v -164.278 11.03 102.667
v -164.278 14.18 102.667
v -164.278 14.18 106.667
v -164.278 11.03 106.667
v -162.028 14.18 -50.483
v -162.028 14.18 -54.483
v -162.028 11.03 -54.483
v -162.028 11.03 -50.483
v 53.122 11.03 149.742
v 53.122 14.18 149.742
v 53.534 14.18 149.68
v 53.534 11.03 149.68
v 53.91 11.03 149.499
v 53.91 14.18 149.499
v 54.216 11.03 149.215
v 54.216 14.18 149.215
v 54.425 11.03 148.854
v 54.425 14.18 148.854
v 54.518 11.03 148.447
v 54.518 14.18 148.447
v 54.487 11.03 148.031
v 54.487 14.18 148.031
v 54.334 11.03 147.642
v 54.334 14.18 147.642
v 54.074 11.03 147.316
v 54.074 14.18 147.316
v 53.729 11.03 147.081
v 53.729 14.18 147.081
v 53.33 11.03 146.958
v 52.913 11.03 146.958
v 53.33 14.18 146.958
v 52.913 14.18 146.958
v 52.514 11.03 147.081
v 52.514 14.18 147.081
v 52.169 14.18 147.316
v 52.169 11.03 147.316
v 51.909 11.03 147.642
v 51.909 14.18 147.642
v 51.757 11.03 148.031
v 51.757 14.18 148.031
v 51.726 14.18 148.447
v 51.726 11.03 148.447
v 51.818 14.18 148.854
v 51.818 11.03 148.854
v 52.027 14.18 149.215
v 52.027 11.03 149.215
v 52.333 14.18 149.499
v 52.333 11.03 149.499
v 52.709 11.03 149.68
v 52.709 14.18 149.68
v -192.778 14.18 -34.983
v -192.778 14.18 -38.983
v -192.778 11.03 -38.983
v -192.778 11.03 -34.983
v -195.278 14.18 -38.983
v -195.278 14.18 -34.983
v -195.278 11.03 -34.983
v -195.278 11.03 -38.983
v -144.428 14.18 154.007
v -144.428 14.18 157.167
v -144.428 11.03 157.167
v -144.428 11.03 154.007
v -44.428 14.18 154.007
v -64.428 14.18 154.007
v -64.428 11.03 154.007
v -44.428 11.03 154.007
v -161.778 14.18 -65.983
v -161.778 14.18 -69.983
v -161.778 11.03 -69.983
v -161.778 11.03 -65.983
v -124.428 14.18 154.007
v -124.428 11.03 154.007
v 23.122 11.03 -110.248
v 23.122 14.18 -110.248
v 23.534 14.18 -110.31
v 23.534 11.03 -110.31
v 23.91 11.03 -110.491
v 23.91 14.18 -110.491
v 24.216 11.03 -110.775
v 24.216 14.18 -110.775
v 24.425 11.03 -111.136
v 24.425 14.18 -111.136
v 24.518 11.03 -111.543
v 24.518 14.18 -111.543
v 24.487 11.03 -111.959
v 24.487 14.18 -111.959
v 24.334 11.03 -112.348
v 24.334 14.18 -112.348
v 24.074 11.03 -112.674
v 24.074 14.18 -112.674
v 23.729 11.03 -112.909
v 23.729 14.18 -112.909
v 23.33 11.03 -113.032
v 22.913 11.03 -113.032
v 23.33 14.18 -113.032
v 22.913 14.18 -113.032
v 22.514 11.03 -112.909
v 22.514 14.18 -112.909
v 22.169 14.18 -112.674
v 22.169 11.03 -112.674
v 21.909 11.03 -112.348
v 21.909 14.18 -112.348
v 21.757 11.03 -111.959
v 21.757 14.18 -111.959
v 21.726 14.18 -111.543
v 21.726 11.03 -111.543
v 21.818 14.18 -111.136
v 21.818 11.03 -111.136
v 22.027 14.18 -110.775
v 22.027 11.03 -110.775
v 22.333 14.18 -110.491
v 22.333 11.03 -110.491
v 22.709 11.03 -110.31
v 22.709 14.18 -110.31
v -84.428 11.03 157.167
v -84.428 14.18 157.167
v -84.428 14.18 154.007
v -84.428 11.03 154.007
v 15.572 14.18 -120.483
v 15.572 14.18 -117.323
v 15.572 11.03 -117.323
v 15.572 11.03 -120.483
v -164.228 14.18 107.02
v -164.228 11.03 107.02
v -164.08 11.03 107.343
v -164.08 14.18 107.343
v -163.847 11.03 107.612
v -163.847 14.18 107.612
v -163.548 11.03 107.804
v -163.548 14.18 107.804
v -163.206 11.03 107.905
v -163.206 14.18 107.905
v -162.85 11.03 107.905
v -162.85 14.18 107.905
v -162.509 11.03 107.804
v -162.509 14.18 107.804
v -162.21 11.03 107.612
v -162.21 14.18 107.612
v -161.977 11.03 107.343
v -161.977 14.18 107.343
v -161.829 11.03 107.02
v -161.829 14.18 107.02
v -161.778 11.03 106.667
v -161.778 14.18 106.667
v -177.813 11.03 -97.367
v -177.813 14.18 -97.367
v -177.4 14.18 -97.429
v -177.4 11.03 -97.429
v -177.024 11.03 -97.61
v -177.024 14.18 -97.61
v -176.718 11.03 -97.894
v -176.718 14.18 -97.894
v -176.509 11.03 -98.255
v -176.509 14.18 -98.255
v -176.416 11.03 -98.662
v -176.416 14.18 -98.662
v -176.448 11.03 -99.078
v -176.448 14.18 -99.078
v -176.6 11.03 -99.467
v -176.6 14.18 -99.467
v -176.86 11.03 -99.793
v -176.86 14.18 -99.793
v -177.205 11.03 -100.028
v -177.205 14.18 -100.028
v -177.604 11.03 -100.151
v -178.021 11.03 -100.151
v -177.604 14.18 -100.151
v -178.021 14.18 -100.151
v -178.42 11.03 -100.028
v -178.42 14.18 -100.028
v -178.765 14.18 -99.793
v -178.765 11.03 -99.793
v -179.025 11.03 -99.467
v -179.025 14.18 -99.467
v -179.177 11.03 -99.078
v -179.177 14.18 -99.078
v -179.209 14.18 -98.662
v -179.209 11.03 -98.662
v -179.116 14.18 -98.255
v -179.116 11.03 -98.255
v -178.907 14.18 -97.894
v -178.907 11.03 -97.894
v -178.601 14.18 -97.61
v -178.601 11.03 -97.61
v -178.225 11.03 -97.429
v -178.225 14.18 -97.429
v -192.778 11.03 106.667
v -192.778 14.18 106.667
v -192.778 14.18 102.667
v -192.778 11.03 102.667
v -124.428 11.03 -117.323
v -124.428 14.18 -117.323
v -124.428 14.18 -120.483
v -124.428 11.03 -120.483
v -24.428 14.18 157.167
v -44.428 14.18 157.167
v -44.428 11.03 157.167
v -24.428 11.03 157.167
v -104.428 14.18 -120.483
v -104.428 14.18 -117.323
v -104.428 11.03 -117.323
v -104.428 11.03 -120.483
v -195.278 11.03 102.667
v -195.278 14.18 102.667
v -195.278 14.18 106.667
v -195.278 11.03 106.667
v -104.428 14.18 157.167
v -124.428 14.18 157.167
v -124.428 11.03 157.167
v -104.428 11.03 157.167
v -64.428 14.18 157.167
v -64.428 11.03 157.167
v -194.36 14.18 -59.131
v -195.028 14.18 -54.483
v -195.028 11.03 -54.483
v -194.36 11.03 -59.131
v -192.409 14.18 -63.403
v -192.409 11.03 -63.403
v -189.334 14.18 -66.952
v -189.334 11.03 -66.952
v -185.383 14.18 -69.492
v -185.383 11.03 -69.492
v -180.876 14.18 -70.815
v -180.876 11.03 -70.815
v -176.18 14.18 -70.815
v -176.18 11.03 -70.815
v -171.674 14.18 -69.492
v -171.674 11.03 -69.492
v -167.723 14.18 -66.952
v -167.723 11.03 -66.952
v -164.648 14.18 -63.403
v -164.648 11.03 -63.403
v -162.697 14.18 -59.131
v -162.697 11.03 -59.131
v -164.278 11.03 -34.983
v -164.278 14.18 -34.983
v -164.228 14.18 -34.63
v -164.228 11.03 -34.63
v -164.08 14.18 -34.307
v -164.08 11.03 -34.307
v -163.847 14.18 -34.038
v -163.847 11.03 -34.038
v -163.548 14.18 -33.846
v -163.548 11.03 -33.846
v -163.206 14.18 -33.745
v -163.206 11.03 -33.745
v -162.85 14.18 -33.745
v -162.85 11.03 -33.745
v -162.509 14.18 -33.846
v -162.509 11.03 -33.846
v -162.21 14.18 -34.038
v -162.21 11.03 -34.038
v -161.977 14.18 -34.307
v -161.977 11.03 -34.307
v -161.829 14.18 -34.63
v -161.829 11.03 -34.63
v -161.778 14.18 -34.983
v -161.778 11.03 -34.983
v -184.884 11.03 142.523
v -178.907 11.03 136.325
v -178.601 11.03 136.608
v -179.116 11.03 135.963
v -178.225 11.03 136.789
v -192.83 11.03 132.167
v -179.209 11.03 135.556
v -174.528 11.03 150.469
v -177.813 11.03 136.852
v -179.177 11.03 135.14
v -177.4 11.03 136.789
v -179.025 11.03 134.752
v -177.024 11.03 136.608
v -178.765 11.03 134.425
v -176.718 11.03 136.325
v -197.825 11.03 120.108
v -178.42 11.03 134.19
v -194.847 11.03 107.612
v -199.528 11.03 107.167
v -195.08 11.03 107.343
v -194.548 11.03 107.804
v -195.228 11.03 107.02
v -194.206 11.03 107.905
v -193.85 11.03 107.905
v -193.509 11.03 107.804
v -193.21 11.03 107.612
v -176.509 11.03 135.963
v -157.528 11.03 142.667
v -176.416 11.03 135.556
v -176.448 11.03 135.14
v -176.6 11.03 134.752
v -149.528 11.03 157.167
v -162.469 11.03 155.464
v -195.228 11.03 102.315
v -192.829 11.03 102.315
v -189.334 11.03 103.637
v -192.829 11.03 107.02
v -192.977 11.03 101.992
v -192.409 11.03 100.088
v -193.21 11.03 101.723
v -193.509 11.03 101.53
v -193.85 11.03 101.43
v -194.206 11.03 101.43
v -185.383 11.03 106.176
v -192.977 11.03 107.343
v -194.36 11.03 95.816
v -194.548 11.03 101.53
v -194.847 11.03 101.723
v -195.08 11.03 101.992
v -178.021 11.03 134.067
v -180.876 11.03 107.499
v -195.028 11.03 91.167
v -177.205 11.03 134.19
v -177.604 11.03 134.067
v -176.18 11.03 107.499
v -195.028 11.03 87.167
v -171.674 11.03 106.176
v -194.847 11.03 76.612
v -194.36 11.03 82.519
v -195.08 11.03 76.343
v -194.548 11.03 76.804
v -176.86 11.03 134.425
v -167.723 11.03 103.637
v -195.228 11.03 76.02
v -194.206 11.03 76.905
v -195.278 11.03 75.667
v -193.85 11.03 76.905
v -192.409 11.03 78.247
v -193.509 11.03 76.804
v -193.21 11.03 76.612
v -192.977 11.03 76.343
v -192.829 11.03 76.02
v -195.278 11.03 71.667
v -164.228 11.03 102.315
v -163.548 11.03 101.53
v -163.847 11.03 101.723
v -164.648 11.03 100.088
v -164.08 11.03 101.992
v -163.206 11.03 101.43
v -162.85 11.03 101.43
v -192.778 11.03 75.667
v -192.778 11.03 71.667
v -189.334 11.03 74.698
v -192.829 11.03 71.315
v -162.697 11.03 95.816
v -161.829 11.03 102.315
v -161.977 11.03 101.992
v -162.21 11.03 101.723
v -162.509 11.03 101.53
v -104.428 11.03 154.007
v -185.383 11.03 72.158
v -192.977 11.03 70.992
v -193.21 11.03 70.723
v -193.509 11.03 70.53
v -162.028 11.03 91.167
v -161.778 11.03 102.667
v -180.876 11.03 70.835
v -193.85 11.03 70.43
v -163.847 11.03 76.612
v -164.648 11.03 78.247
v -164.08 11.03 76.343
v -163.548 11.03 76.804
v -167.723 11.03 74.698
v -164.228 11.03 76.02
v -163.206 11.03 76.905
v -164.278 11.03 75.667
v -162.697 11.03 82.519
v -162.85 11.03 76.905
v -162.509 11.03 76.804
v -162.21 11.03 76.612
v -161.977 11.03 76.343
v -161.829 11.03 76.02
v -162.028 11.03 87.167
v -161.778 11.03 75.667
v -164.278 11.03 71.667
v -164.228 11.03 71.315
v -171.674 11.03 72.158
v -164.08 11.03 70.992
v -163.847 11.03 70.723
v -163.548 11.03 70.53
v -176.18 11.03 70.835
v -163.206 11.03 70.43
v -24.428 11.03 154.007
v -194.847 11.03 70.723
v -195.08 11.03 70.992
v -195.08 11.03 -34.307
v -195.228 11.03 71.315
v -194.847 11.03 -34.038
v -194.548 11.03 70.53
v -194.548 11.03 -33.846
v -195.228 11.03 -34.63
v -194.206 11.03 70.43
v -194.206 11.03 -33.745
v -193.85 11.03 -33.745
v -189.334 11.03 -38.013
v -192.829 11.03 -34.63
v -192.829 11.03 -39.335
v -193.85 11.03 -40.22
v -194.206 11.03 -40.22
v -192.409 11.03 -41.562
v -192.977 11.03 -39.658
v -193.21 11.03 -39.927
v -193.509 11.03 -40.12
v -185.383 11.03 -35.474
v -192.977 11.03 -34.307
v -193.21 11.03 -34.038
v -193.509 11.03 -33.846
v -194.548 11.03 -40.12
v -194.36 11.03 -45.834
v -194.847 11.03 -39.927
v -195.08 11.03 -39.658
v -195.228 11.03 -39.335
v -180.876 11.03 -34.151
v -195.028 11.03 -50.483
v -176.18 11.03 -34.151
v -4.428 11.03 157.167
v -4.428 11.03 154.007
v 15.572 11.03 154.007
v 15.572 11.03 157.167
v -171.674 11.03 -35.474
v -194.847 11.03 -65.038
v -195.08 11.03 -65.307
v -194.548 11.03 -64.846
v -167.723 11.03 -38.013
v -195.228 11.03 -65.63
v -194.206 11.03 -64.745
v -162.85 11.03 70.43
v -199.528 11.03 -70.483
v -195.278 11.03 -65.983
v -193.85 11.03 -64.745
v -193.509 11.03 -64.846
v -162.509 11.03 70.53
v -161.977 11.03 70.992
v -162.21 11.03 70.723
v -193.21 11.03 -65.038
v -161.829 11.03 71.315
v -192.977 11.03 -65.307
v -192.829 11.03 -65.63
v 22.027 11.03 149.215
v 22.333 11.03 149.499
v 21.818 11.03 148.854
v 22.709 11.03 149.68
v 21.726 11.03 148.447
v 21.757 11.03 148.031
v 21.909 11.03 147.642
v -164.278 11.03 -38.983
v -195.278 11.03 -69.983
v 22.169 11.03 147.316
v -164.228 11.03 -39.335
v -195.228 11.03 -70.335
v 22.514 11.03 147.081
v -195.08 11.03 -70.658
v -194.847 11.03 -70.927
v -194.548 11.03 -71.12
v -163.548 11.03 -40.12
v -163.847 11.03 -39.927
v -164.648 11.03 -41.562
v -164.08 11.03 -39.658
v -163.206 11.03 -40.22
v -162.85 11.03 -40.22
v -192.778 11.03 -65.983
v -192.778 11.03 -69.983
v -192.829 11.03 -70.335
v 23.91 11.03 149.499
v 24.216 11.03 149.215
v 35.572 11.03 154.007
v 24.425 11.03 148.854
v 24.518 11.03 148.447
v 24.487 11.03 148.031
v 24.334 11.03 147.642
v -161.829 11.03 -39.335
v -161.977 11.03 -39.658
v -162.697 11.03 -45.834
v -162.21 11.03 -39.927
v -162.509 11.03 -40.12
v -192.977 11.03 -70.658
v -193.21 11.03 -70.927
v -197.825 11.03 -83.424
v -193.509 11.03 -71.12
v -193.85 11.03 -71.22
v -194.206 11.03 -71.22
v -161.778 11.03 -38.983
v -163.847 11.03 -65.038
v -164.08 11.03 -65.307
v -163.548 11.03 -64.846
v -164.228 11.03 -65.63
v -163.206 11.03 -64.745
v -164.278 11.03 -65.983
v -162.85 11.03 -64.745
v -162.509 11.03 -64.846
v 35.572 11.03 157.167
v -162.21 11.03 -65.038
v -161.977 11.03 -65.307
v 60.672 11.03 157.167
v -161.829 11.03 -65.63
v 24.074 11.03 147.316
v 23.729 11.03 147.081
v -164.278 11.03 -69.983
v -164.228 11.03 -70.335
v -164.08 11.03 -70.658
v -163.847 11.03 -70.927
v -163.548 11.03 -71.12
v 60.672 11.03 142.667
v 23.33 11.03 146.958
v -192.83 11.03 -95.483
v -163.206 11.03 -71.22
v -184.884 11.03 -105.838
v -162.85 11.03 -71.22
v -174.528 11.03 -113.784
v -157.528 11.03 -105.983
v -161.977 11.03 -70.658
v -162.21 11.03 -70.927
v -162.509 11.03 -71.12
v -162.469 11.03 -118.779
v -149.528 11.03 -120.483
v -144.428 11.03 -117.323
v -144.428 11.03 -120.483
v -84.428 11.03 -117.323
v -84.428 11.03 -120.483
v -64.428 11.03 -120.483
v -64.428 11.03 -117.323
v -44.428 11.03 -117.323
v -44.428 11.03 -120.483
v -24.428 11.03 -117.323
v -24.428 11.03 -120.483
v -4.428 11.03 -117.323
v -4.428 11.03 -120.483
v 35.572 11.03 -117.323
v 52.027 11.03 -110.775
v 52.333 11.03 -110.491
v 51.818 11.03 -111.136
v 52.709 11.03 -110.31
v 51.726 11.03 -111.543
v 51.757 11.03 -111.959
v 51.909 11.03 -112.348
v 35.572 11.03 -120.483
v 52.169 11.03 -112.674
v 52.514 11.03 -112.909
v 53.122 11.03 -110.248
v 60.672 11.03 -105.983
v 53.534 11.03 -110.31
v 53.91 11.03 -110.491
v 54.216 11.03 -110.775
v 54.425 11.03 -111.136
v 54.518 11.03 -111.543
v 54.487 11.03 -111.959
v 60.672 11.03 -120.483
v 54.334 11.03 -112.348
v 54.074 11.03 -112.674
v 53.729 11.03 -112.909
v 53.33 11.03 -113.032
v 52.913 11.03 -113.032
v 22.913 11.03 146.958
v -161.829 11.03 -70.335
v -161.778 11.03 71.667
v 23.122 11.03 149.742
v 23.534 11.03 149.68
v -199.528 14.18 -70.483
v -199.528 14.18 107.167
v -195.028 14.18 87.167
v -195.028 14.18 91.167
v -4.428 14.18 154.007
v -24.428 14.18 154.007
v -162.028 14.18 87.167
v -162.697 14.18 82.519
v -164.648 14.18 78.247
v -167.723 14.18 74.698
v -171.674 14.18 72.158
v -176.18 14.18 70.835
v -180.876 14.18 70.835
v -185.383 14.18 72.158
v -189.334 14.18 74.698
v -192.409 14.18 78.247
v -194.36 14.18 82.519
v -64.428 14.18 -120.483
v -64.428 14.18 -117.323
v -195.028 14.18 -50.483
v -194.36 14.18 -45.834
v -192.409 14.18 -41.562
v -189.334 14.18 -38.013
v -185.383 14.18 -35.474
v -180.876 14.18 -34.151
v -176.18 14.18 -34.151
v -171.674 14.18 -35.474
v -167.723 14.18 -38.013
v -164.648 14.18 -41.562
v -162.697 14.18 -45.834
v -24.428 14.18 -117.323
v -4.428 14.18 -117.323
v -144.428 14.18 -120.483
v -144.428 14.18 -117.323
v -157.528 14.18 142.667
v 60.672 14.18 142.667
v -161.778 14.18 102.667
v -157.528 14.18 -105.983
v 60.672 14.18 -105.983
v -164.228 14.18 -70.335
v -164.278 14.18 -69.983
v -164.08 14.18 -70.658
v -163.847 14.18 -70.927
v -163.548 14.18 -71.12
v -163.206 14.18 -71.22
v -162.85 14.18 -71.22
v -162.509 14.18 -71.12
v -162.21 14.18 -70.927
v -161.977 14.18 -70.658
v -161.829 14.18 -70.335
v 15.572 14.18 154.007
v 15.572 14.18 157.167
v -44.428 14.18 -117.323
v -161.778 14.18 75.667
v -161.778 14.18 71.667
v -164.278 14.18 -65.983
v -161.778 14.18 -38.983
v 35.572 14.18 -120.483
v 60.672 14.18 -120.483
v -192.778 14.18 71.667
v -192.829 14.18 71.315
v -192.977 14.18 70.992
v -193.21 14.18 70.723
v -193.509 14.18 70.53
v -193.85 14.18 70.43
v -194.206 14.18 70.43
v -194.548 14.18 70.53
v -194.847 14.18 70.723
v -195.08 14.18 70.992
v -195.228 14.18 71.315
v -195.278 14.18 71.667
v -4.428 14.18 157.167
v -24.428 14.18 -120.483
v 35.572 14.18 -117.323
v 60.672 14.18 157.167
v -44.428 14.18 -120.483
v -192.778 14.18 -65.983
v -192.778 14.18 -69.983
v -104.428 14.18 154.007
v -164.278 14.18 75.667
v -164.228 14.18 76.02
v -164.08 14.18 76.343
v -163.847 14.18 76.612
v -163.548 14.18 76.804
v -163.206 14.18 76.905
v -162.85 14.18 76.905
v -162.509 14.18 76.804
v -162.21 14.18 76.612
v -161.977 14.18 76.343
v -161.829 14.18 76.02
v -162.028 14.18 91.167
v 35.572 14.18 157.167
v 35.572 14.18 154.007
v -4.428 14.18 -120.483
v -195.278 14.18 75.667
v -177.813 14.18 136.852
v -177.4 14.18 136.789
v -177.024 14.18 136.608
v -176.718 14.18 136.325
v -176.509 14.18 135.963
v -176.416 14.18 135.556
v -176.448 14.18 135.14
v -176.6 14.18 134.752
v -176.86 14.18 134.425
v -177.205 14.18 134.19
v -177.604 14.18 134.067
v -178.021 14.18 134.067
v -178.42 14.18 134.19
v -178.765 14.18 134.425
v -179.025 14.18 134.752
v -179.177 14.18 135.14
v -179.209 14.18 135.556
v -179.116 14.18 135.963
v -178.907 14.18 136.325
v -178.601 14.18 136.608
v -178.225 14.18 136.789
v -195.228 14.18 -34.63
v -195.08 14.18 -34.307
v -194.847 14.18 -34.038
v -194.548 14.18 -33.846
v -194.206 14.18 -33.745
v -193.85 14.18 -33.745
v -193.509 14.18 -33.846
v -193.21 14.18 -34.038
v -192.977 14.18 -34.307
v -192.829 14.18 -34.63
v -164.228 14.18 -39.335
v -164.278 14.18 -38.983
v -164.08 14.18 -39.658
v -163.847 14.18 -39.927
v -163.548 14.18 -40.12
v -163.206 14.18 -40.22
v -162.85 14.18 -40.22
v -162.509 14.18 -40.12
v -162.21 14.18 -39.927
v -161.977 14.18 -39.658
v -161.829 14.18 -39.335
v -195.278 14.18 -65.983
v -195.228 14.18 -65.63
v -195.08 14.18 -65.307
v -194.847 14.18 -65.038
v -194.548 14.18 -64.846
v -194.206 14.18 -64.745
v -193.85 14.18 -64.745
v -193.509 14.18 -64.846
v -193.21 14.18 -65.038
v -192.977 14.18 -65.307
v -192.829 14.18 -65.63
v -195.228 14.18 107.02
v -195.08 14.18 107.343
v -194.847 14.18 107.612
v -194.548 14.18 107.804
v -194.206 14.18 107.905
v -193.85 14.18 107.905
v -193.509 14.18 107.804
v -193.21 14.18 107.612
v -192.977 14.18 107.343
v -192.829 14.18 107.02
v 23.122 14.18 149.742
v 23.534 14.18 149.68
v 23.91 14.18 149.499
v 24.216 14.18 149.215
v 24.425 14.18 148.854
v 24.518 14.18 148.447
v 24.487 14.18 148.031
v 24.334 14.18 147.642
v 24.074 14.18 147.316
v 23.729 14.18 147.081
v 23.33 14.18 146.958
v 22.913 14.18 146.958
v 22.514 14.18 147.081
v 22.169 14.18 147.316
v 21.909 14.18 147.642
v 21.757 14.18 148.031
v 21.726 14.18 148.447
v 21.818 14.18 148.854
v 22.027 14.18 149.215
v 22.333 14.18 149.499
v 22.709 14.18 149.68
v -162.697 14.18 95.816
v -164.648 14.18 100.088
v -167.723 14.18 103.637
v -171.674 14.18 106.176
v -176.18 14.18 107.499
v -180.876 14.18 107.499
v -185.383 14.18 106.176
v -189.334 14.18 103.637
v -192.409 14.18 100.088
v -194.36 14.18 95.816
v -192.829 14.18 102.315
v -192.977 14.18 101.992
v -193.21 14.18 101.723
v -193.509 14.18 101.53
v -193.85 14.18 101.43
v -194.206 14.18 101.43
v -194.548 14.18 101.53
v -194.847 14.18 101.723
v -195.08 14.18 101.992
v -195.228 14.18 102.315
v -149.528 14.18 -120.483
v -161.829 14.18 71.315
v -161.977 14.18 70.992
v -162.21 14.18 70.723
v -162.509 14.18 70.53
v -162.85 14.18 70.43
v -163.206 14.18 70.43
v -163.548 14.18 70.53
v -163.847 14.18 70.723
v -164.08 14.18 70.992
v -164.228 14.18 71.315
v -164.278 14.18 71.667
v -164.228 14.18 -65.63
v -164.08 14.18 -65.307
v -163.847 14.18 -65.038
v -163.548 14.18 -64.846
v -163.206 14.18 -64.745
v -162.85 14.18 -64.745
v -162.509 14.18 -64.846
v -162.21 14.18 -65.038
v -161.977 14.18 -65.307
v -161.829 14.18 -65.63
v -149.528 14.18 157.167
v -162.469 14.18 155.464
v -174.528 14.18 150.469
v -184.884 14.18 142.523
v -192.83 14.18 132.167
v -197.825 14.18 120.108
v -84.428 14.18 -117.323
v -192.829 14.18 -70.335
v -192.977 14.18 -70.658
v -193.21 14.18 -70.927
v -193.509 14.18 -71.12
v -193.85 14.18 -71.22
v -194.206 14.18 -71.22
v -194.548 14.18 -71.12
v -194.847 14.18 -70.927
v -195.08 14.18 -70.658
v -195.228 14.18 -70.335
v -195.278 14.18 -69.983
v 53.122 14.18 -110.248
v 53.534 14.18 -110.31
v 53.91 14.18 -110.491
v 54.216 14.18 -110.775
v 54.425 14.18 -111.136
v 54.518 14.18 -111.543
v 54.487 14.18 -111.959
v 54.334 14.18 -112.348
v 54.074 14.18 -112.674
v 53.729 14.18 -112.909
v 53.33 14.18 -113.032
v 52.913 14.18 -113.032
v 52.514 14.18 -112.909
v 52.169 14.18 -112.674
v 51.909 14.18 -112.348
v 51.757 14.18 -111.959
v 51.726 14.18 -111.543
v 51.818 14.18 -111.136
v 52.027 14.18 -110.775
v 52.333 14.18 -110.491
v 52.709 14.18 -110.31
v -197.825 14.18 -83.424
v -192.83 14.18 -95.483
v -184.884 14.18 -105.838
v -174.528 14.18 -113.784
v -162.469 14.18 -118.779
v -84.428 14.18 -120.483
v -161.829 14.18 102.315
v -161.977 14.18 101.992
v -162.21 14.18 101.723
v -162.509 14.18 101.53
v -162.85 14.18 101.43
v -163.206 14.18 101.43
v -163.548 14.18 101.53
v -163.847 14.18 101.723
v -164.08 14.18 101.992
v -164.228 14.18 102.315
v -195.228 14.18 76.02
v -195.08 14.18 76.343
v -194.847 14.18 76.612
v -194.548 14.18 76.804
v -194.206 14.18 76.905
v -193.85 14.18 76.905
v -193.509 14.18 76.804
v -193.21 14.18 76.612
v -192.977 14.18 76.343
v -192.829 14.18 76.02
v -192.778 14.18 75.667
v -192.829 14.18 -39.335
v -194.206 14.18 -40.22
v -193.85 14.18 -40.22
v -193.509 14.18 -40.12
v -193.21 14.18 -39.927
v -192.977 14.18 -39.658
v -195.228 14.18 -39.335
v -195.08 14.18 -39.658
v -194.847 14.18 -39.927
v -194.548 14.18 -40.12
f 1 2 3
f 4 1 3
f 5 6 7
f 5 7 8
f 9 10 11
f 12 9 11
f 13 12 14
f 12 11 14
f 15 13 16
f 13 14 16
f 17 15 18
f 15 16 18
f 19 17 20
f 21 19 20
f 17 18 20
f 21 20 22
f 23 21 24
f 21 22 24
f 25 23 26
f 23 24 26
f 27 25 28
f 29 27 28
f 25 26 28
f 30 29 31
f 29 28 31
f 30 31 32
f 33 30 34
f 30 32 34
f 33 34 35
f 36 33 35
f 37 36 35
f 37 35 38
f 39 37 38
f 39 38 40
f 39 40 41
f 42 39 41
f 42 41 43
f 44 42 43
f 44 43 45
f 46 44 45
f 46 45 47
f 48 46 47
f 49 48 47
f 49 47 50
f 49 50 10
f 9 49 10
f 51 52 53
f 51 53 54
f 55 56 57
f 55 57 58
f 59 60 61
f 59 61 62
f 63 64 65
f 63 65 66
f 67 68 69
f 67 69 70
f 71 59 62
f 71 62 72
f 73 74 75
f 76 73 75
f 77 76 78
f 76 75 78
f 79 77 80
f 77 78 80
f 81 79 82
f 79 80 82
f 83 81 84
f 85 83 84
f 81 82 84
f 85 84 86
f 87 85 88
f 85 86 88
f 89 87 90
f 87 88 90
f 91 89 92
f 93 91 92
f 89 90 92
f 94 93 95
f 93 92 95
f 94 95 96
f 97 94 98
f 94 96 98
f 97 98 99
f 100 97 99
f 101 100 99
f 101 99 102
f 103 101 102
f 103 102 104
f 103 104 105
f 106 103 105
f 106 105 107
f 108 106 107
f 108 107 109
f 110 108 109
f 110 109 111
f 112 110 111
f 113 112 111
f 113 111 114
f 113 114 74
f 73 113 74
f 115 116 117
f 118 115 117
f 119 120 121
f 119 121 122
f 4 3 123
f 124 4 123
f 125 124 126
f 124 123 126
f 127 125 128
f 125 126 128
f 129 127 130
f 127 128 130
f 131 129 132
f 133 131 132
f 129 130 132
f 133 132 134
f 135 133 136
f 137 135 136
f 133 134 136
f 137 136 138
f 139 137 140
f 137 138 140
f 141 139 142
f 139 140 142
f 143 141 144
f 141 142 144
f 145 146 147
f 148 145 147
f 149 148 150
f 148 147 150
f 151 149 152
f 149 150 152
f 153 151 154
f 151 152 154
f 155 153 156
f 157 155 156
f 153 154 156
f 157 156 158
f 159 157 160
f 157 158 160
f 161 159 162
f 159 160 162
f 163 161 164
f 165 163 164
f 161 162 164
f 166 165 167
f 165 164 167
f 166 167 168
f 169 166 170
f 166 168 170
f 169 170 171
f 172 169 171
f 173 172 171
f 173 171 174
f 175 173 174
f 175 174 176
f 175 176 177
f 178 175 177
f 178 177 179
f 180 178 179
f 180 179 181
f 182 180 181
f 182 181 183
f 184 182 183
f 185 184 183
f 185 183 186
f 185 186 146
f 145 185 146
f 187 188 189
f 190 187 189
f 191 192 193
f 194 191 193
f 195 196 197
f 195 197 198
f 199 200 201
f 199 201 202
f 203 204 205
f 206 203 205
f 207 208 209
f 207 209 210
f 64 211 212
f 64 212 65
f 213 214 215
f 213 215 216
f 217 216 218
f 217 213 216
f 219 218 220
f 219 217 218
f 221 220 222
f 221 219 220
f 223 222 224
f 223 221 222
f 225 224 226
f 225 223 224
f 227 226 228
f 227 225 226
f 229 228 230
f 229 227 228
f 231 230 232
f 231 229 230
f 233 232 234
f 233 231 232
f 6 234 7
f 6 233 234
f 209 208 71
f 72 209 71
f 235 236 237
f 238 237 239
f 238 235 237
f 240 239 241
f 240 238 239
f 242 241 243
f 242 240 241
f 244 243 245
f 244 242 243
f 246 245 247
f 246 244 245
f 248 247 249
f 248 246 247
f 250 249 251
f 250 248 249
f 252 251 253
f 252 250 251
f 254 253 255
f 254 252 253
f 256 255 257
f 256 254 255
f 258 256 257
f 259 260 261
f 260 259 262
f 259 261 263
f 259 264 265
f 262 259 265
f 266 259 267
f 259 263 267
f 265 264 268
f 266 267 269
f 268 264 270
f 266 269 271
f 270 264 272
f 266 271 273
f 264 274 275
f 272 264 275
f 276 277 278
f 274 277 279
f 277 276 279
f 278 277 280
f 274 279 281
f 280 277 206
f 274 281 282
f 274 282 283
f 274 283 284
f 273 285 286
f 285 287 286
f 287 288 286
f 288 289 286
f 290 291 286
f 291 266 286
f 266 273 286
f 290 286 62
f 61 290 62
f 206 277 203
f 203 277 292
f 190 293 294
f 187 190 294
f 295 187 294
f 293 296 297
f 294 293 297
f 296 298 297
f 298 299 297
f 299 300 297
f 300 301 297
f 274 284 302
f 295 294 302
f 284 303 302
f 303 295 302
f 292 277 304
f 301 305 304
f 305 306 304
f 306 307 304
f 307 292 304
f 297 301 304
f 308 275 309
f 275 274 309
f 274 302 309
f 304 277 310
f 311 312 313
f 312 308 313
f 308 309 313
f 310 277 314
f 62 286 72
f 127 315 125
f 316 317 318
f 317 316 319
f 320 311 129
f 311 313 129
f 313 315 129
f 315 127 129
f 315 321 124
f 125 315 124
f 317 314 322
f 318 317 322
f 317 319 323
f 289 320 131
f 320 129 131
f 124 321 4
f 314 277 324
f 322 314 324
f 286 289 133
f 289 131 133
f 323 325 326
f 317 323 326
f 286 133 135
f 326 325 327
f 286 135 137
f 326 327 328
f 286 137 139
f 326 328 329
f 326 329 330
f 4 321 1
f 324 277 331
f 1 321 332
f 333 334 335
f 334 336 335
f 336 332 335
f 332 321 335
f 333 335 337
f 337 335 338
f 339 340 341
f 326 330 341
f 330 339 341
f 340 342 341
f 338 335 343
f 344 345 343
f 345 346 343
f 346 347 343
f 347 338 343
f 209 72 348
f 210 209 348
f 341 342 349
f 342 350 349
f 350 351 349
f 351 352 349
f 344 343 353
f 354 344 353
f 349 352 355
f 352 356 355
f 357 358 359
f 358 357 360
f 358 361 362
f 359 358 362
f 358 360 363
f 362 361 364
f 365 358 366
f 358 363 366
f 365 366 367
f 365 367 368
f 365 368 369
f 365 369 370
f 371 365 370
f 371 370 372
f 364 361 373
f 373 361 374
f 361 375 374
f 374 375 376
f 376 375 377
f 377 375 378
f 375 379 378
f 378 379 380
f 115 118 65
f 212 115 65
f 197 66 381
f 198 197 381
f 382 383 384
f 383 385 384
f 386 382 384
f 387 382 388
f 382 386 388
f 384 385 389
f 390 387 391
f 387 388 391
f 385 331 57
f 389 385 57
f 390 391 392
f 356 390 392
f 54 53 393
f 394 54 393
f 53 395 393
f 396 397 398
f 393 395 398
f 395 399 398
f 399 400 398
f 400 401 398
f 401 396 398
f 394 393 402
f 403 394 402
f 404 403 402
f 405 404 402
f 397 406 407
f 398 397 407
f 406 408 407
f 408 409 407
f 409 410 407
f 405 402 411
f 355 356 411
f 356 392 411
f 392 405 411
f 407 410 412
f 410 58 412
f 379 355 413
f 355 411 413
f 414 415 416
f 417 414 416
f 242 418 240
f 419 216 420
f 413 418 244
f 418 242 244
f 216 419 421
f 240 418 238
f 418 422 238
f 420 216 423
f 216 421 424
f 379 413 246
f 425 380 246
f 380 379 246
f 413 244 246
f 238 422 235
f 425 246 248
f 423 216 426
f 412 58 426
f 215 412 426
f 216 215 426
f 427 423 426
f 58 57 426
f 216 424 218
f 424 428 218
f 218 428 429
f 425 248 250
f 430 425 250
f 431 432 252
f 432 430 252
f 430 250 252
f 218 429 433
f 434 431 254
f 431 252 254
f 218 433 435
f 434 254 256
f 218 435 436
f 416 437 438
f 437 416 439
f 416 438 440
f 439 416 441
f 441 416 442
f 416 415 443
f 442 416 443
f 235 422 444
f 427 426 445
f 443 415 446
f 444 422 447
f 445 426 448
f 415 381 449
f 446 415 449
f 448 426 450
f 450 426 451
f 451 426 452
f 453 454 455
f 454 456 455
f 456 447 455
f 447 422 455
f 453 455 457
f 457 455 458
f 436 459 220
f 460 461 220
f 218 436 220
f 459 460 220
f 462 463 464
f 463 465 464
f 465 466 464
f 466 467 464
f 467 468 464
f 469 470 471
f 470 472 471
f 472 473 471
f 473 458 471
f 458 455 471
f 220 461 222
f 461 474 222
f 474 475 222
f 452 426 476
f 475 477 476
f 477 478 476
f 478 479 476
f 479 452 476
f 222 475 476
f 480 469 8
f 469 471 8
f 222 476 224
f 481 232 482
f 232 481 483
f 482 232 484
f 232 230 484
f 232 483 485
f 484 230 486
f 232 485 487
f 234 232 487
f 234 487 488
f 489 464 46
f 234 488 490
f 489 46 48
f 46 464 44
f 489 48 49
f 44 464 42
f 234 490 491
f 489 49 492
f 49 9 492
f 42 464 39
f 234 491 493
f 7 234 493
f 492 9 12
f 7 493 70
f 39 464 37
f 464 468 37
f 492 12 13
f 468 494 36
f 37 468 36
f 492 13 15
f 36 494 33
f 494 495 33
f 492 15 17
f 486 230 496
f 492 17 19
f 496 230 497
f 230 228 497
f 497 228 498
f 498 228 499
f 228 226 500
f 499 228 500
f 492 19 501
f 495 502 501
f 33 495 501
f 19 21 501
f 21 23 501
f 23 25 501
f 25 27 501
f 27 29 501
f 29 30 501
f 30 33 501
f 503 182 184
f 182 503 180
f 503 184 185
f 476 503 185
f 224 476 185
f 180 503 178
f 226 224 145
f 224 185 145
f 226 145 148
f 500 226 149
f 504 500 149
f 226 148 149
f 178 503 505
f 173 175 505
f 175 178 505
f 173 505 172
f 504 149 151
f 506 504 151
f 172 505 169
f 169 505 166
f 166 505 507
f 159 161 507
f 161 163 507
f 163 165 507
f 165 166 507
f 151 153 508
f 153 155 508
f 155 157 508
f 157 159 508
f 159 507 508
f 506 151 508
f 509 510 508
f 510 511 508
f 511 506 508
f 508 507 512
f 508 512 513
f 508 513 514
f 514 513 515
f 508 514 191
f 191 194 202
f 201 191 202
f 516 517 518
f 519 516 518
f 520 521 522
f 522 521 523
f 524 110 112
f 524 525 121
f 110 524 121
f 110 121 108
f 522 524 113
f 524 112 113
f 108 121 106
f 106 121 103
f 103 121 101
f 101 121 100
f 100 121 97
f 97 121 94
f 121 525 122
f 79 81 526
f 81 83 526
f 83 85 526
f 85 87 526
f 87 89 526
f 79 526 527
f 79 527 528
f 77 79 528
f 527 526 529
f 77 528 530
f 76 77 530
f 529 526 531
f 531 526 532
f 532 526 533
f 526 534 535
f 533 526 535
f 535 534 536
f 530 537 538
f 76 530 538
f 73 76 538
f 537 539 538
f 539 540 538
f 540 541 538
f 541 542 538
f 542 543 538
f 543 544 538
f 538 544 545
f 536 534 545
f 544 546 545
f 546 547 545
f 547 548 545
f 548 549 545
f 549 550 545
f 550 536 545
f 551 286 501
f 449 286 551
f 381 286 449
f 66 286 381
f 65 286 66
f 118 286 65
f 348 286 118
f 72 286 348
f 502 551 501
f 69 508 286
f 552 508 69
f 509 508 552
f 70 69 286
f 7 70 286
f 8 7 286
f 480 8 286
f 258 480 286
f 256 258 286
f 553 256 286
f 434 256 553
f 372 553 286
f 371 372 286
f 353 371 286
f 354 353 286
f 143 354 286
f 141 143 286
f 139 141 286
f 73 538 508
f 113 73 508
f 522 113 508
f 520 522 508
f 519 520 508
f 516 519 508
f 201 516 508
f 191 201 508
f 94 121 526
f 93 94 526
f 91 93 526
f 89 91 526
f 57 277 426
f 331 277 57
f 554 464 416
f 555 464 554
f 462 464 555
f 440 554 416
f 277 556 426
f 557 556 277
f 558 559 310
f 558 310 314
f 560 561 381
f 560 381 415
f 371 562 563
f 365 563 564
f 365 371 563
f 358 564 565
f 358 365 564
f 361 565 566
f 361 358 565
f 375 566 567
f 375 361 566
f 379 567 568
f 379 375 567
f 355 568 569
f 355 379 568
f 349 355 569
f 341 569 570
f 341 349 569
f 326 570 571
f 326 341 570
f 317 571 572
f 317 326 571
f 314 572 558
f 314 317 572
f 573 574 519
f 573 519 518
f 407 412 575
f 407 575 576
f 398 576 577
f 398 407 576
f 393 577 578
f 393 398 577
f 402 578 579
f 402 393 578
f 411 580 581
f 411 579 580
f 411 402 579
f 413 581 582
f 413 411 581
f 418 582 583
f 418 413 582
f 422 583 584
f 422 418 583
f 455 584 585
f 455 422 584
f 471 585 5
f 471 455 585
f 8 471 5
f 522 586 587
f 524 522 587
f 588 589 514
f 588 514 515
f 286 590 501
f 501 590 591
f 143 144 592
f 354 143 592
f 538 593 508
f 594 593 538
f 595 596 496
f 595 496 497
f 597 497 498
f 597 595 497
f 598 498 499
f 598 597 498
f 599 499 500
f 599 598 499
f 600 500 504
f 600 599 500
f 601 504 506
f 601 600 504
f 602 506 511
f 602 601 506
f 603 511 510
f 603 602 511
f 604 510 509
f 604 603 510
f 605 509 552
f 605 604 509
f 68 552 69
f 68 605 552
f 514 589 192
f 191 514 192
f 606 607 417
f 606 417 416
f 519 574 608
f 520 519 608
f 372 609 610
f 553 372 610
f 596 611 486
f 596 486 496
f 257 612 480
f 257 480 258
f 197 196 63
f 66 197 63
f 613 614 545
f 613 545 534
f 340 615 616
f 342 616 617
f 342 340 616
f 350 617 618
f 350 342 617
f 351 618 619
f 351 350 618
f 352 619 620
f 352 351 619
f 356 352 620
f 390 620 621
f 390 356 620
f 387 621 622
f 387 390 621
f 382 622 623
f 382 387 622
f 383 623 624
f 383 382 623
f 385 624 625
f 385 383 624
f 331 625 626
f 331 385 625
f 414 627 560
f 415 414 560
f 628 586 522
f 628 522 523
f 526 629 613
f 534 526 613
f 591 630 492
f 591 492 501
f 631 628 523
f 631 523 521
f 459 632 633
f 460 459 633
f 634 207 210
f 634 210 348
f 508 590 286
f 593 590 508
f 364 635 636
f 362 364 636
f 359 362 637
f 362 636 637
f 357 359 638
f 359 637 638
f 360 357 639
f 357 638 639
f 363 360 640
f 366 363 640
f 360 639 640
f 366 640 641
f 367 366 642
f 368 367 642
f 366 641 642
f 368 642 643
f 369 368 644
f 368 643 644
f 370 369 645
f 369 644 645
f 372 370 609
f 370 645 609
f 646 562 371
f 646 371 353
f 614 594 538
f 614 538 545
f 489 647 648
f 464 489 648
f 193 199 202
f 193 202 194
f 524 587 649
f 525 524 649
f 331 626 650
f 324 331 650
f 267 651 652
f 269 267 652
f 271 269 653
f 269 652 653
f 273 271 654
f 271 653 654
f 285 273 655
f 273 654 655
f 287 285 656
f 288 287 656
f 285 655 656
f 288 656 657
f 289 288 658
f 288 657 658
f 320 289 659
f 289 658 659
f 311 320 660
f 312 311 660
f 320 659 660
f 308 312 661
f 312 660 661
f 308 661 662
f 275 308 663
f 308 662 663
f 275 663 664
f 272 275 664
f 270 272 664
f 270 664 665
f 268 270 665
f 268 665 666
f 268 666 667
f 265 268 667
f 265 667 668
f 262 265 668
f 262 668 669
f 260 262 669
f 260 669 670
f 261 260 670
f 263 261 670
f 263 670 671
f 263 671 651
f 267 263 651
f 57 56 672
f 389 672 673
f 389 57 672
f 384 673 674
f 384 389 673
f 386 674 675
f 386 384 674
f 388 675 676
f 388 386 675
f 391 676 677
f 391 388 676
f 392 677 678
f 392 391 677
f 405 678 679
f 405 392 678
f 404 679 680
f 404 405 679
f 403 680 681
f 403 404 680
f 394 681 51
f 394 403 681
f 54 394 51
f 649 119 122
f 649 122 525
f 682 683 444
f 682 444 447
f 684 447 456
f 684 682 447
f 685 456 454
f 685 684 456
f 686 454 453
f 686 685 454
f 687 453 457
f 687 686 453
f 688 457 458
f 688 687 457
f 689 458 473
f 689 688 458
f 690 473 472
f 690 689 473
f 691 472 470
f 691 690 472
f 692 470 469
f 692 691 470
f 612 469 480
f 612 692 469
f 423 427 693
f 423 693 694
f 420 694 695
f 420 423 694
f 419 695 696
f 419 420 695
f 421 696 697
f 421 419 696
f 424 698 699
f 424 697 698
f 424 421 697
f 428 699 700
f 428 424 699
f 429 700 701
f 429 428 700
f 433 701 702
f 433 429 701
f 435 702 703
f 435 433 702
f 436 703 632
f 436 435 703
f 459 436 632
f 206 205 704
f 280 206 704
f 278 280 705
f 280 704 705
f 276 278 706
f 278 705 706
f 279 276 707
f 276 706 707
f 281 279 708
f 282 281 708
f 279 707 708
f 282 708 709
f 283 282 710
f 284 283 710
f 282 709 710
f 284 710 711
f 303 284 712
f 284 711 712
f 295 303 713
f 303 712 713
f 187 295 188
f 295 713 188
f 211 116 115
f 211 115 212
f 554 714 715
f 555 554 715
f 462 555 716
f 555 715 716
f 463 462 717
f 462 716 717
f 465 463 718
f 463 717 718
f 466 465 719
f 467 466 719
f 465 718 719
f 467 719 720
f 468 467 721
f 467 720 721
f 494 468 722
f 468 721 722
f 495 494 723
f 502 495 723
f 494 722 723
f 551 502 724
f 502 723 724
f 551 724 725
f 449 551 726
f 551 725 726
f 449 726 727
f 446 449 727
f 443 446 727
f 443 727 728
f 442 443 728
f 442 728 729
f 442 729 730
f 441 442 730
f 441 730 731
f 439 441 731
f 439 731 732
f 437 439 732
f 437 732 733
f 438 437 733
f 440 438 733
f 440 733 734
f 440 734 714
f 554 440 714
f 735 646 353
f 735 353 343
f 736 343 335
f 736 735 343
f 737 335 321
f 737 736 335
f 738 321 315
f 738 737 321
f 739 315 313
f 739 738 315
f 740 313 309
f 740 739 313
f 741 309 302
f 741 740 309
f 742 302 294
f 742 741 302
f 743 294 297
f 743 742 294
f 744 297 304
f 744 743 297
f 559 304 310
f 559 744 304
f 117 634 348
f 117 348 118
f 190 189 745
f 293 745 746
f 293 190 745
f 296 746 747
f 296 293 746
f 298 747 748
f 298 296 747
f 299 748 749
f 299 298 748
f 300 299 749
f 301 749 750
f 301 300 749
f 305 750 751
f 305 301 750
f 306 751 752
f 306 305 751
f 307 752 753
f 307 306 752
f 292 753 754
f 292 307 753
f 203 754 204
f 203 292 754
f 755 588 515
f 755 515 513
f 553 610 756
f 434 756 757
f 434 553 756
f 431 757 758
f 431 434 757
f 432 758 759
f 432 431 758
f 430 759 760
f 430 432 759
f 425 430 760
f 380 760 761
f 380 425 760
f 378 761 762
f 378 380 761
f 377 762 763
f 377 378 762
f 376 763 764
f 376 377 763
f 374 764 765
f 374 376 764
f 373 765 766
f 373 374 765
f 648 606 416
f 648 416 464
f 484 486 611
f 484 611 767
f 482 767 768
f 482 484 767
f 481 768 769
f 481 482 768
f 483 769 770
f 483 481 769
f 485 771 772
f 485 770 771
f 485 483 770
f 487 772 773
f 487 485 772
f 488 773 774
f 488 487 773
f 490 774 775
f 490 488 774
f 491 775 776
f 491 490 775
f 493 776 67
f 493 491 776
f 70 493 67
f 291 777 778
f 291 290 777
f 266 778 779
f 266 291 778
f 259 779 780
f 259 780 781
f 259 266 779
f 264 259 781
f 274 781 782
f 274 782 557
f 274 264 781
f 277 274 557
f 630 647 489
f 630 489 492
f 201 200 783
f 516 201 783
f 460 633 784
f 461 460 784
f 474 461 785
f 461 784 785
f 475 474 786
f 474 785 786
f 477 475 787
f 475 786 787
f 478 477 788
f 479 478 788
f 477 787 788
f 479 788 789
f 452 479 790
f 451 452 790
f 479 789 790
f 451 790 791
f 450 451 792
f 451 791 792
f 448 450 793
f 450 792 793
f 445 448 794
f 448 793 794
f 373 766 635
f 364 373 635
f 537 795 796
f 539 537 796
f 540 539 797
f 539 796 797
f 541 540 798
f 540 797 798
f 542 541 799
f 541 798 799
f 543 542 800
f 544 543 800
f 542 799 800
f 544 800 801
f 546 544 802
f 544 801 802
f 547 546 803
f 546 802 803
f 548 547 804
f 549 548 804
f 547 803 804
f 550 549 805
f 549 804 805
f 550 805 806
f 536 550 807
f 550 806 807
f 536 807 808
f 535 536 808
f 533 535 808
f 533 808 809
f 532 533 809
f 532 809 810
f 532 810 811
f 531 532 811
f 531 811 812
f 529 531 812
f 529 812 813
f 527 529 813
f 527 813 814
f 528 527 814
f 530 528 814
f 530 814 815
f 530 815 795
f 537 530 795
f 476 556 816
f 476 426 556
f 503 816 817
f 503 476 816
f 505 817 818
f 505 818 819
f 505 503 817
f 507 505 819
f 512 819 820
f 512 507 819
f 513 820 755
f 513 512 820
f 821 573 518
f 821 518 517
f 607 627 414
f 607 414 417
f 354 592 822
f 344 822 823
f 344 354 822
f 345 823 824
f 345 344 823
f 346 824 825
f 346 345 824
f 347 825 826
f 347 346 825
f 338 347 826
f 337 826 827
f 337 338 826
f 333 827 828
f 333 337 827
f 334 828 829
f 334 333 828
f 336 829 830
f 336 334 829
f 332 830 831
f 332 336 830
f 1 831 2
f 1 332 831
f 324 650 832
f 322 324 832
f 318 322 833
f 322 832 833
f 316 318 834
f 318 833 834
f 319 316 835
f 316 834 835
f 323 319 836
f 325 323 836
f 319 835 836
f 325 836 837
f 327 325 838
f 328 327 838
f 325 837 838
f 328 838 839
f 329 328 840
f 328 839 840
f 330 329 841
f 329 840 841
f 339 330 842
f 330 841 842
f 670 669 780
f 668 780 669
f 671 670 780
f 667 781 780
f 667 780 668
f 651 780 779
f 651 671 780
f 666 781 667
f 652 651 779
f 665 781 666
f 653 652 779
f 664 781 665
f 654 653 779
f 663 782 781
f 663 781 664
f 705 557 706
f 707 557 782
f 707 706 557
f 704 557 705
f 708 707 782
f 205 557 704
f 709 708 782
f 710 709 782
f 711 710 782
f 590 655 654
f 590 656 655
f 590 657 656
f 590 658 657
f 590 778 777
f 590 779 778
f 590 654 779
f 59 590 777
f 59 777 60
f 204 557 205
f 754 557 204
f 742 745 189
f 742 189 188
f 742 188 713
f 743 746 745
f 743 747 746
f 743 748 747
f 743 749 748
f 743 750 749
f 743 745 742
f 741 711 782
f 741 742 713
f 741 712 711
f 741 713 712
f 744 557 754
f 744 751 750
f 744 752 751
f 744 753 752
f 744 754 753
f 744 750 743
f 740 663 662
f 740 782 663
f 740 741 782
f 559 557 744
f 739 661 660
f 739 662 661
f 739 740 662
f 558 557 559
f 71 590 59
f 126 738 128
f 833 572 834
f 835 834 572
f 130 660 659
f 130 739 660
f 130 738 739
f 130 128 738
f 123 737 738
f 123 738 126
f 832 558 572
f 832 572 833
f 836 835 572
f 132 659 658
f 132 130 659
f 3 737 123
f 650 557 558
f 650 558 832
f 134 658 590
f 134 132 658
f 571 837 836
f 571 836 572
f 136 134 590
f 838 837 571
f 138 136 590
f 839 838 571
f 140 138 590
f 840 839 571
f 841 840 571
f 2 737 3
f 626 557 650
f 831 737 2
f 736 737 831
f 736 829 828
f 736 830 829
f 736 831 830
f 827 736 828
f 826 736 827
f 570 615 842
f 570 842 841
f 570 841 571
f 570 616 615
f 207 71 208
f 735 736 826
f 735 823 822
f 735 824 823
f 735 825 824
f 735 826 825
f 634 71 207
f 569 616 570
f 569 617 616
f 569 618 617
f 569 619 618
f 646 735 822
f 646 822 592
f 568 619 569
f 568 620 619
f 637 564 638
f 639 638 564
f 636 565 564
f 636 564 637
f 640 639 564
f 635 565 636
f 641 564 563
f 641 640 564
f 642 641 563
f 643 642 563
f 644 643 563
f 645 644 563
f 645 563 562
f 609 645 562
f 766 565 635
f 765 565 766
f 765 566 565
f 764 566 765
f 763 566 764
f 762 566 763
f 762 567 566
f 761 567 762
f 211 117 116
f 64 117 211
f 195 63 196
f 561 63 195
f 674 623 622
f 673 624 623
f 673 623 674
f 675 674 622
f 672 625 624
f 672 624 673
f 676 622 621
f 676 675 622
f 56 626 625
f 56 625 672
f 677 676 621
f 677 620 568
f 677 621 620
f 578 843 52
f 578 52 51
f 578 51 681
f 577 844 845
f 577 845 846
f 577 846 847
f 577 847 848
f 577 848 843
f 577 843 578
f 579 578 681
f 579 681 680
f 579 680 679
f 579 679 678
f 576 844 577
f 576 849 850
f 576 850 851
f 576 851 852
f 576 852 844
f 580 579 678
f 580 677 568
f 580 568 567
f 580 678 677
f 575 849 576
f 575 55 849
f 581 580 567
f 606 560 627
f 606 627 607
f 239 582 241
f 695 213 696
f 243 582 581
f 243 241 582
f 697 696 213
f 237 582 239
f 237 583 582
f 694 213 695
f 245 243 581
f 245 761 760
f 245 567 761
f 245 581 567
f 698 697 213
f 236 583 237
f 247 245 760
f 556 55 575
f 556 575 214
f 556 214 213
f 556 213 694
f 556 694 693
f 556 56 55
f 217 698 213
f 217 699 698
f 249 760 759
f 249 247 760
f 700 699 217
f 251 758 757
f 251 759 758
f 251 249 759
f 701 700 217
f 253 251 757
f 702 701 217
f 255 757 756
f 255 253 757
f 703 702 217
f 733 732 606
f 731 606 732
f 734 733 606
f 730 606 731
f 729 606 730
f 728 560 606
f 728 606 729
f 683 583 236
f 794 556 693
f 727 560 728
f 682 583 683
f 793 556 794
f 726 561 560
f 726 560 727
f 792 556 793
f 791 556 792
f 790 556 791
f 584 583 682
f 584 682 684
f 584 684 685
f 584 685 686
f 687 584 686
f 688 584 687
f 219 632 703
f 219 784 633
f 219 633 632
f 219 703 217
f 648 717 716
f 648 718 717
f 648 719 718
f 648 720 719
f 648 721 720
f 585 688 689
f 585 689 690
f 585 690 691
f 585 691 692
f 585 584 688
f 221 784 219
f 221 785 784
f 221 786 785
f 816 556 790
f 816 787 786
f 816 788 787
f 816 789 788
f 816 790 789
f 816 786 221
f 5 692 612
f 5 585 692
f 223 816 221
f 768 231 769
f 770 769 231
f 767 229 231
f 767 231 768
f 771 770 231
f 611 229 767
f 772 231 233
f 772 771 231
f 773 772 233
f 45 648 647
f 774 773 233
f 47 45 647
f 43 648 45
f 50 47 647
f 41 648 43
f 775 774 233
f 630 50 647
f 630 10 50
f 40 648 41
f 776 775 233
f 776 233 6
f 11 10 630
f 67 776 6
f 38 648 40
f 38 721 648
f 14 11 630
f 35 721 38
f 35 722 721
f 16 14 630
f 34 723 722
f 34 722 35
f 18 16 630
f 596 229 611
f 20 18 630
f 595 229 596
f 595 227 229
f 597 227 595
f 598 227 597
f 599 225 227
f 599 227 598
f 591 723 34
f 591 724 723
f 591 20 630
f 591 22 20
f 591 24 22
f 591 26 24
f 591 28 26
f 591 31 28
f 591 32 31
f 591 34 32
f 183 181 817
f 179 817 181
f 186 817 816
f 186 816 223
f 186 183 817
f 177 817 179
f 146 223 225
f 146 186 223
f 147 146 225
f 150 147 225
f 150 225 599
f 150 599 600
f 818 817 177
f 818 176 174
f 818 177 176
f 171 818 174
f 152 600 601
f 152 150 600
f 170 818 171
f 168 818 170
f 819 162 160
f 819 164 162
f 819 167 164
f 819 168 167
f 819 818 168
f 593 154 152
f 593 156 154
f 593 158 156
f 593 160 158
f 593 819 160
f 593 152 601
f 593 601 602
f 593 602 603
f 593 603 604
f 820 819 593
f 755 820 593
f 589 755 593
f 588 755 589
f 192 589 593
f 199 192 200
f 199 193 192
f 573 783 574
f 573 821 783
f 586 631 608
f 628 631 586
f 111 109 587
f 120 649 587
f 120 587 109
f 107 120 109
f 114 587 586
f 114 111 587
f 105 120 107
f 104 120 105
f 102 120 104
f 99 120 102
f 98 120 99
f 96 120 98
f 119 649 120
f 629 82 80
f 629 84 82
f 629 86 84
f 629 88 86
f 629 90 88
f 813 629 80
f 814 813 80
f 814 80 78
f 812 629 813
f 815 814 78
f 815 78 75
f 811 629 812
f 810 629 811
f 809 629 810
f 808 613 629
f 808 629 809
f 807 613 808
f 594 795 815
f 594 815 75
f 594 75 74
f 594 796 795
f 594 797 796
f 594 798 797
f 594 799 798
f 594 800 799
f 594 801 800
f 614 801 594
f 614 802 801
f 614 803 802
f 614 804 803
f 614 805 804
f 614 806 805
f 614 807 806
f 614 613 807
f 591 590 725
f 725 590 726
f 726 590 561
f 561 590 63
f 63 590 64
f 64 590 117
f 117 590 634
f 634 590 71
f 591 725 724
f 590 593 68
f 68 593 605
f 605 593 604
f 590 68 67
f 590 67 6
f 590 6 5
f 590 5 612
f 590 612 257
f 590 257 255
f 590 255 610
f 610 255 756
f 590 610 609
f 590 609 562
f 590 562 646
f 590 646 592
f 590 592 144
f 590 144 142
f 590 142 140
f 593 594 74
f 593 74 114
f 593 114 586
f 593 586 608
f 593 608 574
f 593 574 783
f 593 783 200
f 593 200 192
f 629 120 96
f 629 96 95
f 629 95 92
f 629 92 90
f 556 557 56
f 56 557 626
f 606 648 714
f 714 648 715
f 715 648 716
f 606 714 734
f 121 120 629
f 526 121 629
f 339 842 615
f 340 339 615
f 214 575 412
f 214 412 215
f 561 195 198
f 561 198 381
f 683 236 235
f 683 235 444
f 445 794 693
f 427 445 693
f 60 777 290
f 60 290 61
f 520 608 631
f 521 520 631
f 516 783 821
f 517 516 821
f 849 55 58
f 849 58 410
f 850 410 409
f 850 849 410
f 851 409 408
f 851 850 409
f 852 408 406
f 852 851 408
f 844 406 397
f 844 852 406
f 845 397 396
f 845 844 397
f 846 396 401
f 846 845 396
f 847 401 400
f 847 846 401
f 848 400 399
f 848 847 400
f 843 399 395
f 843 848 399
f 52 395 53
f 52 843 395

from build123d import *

# Parameters (mm, degrees)
SKETCH1_R           = 1.25
SKETCH1_R_2         = 16.5
BOSS_EXTRUDE1_DEPTH = 3.15
SKETCH2_W           = 42
SKETCH2_H           = 34
BOSS_EXTRUDE2_DEPTH = 3.15
FILLET1_R           = 50
SKETCH3_W           = 20
SKETCH3_H           = 3.16
CUT_EXTRUDE1_DEPTH  = 255.013877696
SKETCH4_R           = 1.4
CUT_EXTRUDE2_DEPTH  = 10
SKETCH5_R           = 1.4
CUT_EXTRUDE3_DEPTH  = 10
CUT_EXTRUDE4_DEPTH  = 255.013877696
SKETCH8_W           = 218.2
SKETCH8_H           = 1.5
BOSS_EXTRUDE3_DEPTH = 3.15


with BuildPart() as part:
    # Sketch1 → Boss-Extrude1 (new body)
    with BuildSketch(Plane(origin=(0, 11.030201327, 0), x_dir=(1, 0, 0), z_dir=(0, 1, 0))):
        Polygon((-162.156726515, -108.167379901), (-194.899872265, -108.167379901), (-199.52829939, -108.167379901), (-199.52829939, 34.111047224), (-199.52829939, 66.854192974), (-199.52829939, 71.482620099), (-194.899872265, 71.482620099), (-162.156726515, 71.482620099), (-157.52829939, 71.482620099), (-157.52829939, -108.167379901), align=None)
        with Locations(Location((-163.02829939, 65.982620099, 0), (0, 0, 270))):
            Circle(SKETCH1_R, mode=Mode.SUBTRACT)
        with Locations(Location((-163.02829939, 34.982620099, 0), (0, 0, 270))):
            Circle(SKETCH1_R, mode=Mode.SUBTRACT)
        with Locations(Location((-194.02829939, 34.982620099, 0), (0, 0, 270))):
            Circle(SKETCH1_R, mode=Mode.SUBTRACT)
        with Locations(Location((-194.02829939, 65.982620099, 0), (0, 0, 270))):
            Circle(SKETCH1_R, mode=Mode.SUBTRACT)
        with Locations(Location((-163.02829939, -102.667379901, 0), (0, 0, 270))):
            Circle(SKETCH1_R, mode=Mode.SUBTRACT)
        with Locations(Location((-163.02829939, -71.667379901, 0), (0, 0, 270))):
            Circle(SKETCH1_R, mode=Mode.SUBTRACT)
        with Locations(Location((-194.02829939, -102.667379901, 0), (0, 0, 270))):
            Circle(SKETCH1_R, mode=Mode.SUBTRACT)
        with Locations(Location((-194.02829939, -71.667379901, 0), (0, 0, 270))):
            Circle(SKETCH1_R, mode=Mode.SUBTRACT)
        with Locations(Location((-178.52829939, -87.167379901, 0), (0, 0, 270))):
            Circle(SKETCH1_R_2, mode=Mode.SUBTRACT)
        with Locations(Location((-178.52829939, 50.482620099, 0), (0, 0, 270))):
            Circle(SKETCH1_R_2, mode=Mode.SUBTRACT)
    extrude(amount=BOSS_EXTRUDE1_DEPTH)

    # Sketch2 → Boss-Extrude2 (add)
    with BuildSketch(Plane(origin=(0, 14.180201327, 0), x_dir=(1, 0, 0), z_dir=(0, 1, 0))):
        Polygon((-157.52829939, -144.167379901), (-157.52829939, -142.167379901), (-157.52829939, -108.167379901), (-199.52829939, -108.167379901), (-199.52829939, -142.167379901), (-199.52829939, -157.167379901), (-157.52829939, -157.167379901), (60.67170061, -157.167379901), (60.67170061, -144.167379901), (45.67170061, -144.167379901), align=None)
        with Locations((-178.52829939, 88.482620099)):
            Rectangle(SKETCH2_W, SKETCH2_H)
        Polygon((-199.52829939, 105.482620099), (-157.52829939, 105.482620099), (-157.52829939, 107.482620099), (45.67170061, 107.482620099), (60.67170061, 107.482620099), (60.67170061, 120.482620099), (-157.52829939, 120.482620099), (-199.52829939, 120.482620099), align=None)
    extrude(amount=-BOSS_EXTRUDE2_DEPTH)

    # Fillet1
    fillet1_edges = [part.edges().sort_by_distance(p)[0] for p in [
        (-199.52829939, 12.605201327, 157.167379901),
        (-199.52829939, 12.605201327, -120.482620099),
    ]]
    fillet(fillet1_edges, radius=FILLET1_R)

    # Sketch3 → Cut-Extrude1 (cut, through all)
    with BuildSketch(Plane(origin=(0, 14.180201327, 0), x_dir=(1, 0, 0), z_dir=(0, 1, 0))):
        with Locations((-94.42829939, 118.902620099)):
            Rectangle(SKETCH3_W, SKETCH3_H)
        with Locations((-134.42829939, 118.902620099)):
            Rectangle(SKETCH3_W, SKETCH3_H)
        with Locations((-54.42829939, 118.902620099)):
            Rectangle(SKETCH3_W, SKETCH3_H)
        with Locations((-14.42829939, 118.902620099)):
            Rectangle(SKETCH3_W, SKETCH3_H)
        with Locations((25.57170061, 118.902620099)):
            Rectangle(SKETCH3_W, SKETCH3_H)
        with Locations((25.57170061, -155.587379901)):
            Rectangle(SKETCH3_W, SKETCH3_H)
        with Locations((-14.42829939, -155.587379901)):
            Rectangle(SKETCH3_W, SKETCH3_H)
        with Locations((-54.42829939, -155.587379901)):
            Rectangle(SKETCH3_W, SKETCH3_H)
        with Locations((-94.42829939, -155.587379901)):
            Rectangle(SKETCH3_W, SKETCH3_H)
        with Locations((-134.42829939, -155.587379901)):
            Rectangle(SKETCH3_W, SKETCH3_H)
    extrude(amount=-CUT_EXTRUDE1_DEPTH, mode=Mode.SUBTRACT)

    # Sketch4 → Cut-Extrude2 (cut)
    with BuildSketch(Plane(origin=(0, 14.180201327, 0), x_dir=(1, 0, 0), z_dir=(0, 1, 0))):
        with Locations(Location((-177.812570637, 98.766891346, 0), (0, 0, 270))):
            Circle(SKETCH4_R)
        with Locations(Location((-177.812570637, -135.451651148, 0), (0, 0, 270))):
            Circle(SKETCH4_R)
    extrude(amount=-CUT_EXTRUDE2_DEPTH, mode=Mode.SUBTRACT)

    # Sketch5 → Cut-Extrude3 (cut)
    with BuildSketch(Plane(origin=(0, 14.180201327, 0), x_dir=(1, 0, 0), z_dir=(0, 1, 0))):
        with Locations(Location((53.12170061, 111.647620099, 0), (0, 0, 270))):
            Circle(SKETCH5_R)
        with Locations(Location((53.12170061, -148.342379901, 0), (0, 0, 270))):
            Circle(SKETCH5_R)
        with Locations(Location((23.12170061, 111.647620099, 0), (0, 0, 270))):
            Circle(SKETCH5_R)
        with Locations(Location((23.12170061, -148.342379901, 0), (0, 0, 270))):
            Circle(SKETCH5_R)
    extrude(amount=-CUT_EXTRUDE3_DEPTH, mode=Mode.SUBTRACT)

    # Sketch6 → Cut-Extrude4 (cut, through all)
    with BuildSketch(Plane(origin=(0, 14.180201327, 0), x_dir=(1, 0, 0), z_dir=(0, 1, 0))):
        with BuildLine():
            Line((-161.77829939, 69.982620099), (-161.77829939, 65.982620099))
            ThreePointArc((-161.77829939, 65.982620099), (-163.02829939, 64.732620099), (-164.27829939, 65.982620099))
            Line((-164.27829939, 65.982620099), (-164.27829939, 69.982620099))
            ThreePointArc((-164.27829939, 69.982620099), (-163.02829939, 71.232620099), (-161.77829939, 69.982620099))
        make_face()
        with BuildLine():
            Line((-161.77829939, 38.982620099), (-161.77829939, 34.982620099))
            ThreePointArc((-161.77829939, 34.982620099), (-163.02829939, 33.732620099), (-164.27829939, 34.982620099))
            Line((-164.27829939, 34.982620099), (-164.27829939, 38.982620099))
            ThreePointArc((-164.27829939, 38.982620099), (-163.02829939, 40.232620099), (-161.77829939, 38.982620099))
        make_face()
        with BuildLine():
            Line((-192.77829939, 38.982620099), (-192.77829939, 34.982620099))
            ThreePointArc((-192.77829939, 34.982620099), (-194.02829939, 33.732620099), (-195.27829939, 34.982620099))
            Line((-195.27829939, 34.982620099), (-195.27829939, 38.982620099))
            ThreePointArc((-195.27829939, 38.982620099), (-194.02829939, 40.232620099), (-192.77829939, 38.982620099))
        make_face()
        with BuildLine():
            Line((-195.27829939, 69.982620099), (-195.27829939, 65.982620099))
            ThreePointArc((-195.27829939, 65.982620099), (-194.02829939, 64.732620099), (-192.77829939, 65.982620099))
            Line((-192.77829939, 65.982620099), (-192.77829939, 69.982620099))
            ThreePointArc((-192.77829939, 69.982620099), (-194.02829939, 71.232620099), (-195.27829939, 69.982620099))
        make_face()
        with BuildLine():
            Line((-162.02829939, 54.482620099), (-162.02829939, 50.482620099))
            ThreePointArc((-162.02829939, 50.482620099), (-178.52829939, 33.982620099), (-195.02829939, 50.482620099))
            Line((-195.02829939, 50.482620099), (-195.02829939, 54.482620099))
            ThreePointArc((-195.02829939, 54.482620099), (-178.52829939, 70.982620099), (-162.02829939, 54.482620099))
        make_face()
        with BuildLine():
            Line((-195.02829939, -91.167379901), (-195.02829939, -87.167379901))
            ThreePointArc((-195.02829939, -87.167379901), (-178.52829939, -70.667379901), (-162.02829939, -87.167379901))
            Line((-162.02829939, -87.167379901), (-162.02829939, -91.167379901))
            ThreePointArc((-162.02829939, -91.167379901), (-178.52829939, -107.667379901), (-195.02829939, -91.167379901))
        make_face()
        with BuildLine():
            Line((-192.77829939, -106.667379901), (-192.77829939, -102.667379901))
            ThreePointArc((-192.77829939, -102.667379901), (-194.02829939, -101.417379901), (-195.27829939, -102.667379901))
            Line((-195.27829939, -102.667379901), (-195.27829939, -106.667379901))
            ThreePointArc((-195.27829939, -106.667379901), (-194.02829939, -107.917379901), (-192.77829939, -106.667379901))
        make_face()
        with BuildLine():
            Line((-195.27829939, -71.667379901), (-195.27829939, -75.667379901))
            ThreePointArc((-195.27829939, -75.667379901), (-194.02829939, -76.917379901), (-192.77829939, -75.667379901))
            Line((-192.77829939, -75.667379901), (-192.77829939, -71.667379901))
            ThreePointArc((-192.77829939, -71.667379901), (-194.02829939, -70.417379901), (-195.27829939, -71.667379901))
        make_face()
        with BuildLine():
            Line((-164.27829939, -71.667379901), (-164.27829939, -75.667379901))
            ThreePointArc((-164.27829939, -75.667379901), (-163.02829939, -76.917379901), (-161.77829939, -75.667379901))
            Line((-161.77829939, -75.667379901), (-161.77829939, -71.667379901))
            ThreePointArc((-161.77829939, -71.667379901), (-163.02829939, -70.417379901), (-164.27829939, -71.667379901))
        make_face()
        with BuildLine():
            Line((-164.27829939, -102.667379901), (-164.27829939, -106.667379901))
            ThreePointArc((-164.27829939, -106.667379901), (-163.02829939, -107.917379901), (-161.77829939, -106.667379901))
            Line((-161.77829939, -106.667379901), (-161.77829939, -102.667379901))
            ThreePointArc((-161.77829939, -102.667379901), (-163.02829939, -101.417379901), (-164.27829939, -102.667379901))
        make_face()
    extrude(amount=-CUT_EXTRUDE4_DEPTH, mode=Mode.SUBTRACT)

    # Sketch8 → Boss-Extrude3 (add)
    with BuildSketch(Plane(origin=(0, 14.180201327, 0), x_dir=(1, 0, 0), z_dir=(0, 1, 0))):
        with Locations((-48.42829939, -143.417379901)):
            Rectangle(SKETCH8_W, SKETCH8_H)
        with Locations((-48.42829939, 106.732620099)):
            Rectangle(SKETCH8_W, SKETCH8_H)
    extrude(amount=-BOSS_EXTRUDE3_DEPTH)


solid = part.part
